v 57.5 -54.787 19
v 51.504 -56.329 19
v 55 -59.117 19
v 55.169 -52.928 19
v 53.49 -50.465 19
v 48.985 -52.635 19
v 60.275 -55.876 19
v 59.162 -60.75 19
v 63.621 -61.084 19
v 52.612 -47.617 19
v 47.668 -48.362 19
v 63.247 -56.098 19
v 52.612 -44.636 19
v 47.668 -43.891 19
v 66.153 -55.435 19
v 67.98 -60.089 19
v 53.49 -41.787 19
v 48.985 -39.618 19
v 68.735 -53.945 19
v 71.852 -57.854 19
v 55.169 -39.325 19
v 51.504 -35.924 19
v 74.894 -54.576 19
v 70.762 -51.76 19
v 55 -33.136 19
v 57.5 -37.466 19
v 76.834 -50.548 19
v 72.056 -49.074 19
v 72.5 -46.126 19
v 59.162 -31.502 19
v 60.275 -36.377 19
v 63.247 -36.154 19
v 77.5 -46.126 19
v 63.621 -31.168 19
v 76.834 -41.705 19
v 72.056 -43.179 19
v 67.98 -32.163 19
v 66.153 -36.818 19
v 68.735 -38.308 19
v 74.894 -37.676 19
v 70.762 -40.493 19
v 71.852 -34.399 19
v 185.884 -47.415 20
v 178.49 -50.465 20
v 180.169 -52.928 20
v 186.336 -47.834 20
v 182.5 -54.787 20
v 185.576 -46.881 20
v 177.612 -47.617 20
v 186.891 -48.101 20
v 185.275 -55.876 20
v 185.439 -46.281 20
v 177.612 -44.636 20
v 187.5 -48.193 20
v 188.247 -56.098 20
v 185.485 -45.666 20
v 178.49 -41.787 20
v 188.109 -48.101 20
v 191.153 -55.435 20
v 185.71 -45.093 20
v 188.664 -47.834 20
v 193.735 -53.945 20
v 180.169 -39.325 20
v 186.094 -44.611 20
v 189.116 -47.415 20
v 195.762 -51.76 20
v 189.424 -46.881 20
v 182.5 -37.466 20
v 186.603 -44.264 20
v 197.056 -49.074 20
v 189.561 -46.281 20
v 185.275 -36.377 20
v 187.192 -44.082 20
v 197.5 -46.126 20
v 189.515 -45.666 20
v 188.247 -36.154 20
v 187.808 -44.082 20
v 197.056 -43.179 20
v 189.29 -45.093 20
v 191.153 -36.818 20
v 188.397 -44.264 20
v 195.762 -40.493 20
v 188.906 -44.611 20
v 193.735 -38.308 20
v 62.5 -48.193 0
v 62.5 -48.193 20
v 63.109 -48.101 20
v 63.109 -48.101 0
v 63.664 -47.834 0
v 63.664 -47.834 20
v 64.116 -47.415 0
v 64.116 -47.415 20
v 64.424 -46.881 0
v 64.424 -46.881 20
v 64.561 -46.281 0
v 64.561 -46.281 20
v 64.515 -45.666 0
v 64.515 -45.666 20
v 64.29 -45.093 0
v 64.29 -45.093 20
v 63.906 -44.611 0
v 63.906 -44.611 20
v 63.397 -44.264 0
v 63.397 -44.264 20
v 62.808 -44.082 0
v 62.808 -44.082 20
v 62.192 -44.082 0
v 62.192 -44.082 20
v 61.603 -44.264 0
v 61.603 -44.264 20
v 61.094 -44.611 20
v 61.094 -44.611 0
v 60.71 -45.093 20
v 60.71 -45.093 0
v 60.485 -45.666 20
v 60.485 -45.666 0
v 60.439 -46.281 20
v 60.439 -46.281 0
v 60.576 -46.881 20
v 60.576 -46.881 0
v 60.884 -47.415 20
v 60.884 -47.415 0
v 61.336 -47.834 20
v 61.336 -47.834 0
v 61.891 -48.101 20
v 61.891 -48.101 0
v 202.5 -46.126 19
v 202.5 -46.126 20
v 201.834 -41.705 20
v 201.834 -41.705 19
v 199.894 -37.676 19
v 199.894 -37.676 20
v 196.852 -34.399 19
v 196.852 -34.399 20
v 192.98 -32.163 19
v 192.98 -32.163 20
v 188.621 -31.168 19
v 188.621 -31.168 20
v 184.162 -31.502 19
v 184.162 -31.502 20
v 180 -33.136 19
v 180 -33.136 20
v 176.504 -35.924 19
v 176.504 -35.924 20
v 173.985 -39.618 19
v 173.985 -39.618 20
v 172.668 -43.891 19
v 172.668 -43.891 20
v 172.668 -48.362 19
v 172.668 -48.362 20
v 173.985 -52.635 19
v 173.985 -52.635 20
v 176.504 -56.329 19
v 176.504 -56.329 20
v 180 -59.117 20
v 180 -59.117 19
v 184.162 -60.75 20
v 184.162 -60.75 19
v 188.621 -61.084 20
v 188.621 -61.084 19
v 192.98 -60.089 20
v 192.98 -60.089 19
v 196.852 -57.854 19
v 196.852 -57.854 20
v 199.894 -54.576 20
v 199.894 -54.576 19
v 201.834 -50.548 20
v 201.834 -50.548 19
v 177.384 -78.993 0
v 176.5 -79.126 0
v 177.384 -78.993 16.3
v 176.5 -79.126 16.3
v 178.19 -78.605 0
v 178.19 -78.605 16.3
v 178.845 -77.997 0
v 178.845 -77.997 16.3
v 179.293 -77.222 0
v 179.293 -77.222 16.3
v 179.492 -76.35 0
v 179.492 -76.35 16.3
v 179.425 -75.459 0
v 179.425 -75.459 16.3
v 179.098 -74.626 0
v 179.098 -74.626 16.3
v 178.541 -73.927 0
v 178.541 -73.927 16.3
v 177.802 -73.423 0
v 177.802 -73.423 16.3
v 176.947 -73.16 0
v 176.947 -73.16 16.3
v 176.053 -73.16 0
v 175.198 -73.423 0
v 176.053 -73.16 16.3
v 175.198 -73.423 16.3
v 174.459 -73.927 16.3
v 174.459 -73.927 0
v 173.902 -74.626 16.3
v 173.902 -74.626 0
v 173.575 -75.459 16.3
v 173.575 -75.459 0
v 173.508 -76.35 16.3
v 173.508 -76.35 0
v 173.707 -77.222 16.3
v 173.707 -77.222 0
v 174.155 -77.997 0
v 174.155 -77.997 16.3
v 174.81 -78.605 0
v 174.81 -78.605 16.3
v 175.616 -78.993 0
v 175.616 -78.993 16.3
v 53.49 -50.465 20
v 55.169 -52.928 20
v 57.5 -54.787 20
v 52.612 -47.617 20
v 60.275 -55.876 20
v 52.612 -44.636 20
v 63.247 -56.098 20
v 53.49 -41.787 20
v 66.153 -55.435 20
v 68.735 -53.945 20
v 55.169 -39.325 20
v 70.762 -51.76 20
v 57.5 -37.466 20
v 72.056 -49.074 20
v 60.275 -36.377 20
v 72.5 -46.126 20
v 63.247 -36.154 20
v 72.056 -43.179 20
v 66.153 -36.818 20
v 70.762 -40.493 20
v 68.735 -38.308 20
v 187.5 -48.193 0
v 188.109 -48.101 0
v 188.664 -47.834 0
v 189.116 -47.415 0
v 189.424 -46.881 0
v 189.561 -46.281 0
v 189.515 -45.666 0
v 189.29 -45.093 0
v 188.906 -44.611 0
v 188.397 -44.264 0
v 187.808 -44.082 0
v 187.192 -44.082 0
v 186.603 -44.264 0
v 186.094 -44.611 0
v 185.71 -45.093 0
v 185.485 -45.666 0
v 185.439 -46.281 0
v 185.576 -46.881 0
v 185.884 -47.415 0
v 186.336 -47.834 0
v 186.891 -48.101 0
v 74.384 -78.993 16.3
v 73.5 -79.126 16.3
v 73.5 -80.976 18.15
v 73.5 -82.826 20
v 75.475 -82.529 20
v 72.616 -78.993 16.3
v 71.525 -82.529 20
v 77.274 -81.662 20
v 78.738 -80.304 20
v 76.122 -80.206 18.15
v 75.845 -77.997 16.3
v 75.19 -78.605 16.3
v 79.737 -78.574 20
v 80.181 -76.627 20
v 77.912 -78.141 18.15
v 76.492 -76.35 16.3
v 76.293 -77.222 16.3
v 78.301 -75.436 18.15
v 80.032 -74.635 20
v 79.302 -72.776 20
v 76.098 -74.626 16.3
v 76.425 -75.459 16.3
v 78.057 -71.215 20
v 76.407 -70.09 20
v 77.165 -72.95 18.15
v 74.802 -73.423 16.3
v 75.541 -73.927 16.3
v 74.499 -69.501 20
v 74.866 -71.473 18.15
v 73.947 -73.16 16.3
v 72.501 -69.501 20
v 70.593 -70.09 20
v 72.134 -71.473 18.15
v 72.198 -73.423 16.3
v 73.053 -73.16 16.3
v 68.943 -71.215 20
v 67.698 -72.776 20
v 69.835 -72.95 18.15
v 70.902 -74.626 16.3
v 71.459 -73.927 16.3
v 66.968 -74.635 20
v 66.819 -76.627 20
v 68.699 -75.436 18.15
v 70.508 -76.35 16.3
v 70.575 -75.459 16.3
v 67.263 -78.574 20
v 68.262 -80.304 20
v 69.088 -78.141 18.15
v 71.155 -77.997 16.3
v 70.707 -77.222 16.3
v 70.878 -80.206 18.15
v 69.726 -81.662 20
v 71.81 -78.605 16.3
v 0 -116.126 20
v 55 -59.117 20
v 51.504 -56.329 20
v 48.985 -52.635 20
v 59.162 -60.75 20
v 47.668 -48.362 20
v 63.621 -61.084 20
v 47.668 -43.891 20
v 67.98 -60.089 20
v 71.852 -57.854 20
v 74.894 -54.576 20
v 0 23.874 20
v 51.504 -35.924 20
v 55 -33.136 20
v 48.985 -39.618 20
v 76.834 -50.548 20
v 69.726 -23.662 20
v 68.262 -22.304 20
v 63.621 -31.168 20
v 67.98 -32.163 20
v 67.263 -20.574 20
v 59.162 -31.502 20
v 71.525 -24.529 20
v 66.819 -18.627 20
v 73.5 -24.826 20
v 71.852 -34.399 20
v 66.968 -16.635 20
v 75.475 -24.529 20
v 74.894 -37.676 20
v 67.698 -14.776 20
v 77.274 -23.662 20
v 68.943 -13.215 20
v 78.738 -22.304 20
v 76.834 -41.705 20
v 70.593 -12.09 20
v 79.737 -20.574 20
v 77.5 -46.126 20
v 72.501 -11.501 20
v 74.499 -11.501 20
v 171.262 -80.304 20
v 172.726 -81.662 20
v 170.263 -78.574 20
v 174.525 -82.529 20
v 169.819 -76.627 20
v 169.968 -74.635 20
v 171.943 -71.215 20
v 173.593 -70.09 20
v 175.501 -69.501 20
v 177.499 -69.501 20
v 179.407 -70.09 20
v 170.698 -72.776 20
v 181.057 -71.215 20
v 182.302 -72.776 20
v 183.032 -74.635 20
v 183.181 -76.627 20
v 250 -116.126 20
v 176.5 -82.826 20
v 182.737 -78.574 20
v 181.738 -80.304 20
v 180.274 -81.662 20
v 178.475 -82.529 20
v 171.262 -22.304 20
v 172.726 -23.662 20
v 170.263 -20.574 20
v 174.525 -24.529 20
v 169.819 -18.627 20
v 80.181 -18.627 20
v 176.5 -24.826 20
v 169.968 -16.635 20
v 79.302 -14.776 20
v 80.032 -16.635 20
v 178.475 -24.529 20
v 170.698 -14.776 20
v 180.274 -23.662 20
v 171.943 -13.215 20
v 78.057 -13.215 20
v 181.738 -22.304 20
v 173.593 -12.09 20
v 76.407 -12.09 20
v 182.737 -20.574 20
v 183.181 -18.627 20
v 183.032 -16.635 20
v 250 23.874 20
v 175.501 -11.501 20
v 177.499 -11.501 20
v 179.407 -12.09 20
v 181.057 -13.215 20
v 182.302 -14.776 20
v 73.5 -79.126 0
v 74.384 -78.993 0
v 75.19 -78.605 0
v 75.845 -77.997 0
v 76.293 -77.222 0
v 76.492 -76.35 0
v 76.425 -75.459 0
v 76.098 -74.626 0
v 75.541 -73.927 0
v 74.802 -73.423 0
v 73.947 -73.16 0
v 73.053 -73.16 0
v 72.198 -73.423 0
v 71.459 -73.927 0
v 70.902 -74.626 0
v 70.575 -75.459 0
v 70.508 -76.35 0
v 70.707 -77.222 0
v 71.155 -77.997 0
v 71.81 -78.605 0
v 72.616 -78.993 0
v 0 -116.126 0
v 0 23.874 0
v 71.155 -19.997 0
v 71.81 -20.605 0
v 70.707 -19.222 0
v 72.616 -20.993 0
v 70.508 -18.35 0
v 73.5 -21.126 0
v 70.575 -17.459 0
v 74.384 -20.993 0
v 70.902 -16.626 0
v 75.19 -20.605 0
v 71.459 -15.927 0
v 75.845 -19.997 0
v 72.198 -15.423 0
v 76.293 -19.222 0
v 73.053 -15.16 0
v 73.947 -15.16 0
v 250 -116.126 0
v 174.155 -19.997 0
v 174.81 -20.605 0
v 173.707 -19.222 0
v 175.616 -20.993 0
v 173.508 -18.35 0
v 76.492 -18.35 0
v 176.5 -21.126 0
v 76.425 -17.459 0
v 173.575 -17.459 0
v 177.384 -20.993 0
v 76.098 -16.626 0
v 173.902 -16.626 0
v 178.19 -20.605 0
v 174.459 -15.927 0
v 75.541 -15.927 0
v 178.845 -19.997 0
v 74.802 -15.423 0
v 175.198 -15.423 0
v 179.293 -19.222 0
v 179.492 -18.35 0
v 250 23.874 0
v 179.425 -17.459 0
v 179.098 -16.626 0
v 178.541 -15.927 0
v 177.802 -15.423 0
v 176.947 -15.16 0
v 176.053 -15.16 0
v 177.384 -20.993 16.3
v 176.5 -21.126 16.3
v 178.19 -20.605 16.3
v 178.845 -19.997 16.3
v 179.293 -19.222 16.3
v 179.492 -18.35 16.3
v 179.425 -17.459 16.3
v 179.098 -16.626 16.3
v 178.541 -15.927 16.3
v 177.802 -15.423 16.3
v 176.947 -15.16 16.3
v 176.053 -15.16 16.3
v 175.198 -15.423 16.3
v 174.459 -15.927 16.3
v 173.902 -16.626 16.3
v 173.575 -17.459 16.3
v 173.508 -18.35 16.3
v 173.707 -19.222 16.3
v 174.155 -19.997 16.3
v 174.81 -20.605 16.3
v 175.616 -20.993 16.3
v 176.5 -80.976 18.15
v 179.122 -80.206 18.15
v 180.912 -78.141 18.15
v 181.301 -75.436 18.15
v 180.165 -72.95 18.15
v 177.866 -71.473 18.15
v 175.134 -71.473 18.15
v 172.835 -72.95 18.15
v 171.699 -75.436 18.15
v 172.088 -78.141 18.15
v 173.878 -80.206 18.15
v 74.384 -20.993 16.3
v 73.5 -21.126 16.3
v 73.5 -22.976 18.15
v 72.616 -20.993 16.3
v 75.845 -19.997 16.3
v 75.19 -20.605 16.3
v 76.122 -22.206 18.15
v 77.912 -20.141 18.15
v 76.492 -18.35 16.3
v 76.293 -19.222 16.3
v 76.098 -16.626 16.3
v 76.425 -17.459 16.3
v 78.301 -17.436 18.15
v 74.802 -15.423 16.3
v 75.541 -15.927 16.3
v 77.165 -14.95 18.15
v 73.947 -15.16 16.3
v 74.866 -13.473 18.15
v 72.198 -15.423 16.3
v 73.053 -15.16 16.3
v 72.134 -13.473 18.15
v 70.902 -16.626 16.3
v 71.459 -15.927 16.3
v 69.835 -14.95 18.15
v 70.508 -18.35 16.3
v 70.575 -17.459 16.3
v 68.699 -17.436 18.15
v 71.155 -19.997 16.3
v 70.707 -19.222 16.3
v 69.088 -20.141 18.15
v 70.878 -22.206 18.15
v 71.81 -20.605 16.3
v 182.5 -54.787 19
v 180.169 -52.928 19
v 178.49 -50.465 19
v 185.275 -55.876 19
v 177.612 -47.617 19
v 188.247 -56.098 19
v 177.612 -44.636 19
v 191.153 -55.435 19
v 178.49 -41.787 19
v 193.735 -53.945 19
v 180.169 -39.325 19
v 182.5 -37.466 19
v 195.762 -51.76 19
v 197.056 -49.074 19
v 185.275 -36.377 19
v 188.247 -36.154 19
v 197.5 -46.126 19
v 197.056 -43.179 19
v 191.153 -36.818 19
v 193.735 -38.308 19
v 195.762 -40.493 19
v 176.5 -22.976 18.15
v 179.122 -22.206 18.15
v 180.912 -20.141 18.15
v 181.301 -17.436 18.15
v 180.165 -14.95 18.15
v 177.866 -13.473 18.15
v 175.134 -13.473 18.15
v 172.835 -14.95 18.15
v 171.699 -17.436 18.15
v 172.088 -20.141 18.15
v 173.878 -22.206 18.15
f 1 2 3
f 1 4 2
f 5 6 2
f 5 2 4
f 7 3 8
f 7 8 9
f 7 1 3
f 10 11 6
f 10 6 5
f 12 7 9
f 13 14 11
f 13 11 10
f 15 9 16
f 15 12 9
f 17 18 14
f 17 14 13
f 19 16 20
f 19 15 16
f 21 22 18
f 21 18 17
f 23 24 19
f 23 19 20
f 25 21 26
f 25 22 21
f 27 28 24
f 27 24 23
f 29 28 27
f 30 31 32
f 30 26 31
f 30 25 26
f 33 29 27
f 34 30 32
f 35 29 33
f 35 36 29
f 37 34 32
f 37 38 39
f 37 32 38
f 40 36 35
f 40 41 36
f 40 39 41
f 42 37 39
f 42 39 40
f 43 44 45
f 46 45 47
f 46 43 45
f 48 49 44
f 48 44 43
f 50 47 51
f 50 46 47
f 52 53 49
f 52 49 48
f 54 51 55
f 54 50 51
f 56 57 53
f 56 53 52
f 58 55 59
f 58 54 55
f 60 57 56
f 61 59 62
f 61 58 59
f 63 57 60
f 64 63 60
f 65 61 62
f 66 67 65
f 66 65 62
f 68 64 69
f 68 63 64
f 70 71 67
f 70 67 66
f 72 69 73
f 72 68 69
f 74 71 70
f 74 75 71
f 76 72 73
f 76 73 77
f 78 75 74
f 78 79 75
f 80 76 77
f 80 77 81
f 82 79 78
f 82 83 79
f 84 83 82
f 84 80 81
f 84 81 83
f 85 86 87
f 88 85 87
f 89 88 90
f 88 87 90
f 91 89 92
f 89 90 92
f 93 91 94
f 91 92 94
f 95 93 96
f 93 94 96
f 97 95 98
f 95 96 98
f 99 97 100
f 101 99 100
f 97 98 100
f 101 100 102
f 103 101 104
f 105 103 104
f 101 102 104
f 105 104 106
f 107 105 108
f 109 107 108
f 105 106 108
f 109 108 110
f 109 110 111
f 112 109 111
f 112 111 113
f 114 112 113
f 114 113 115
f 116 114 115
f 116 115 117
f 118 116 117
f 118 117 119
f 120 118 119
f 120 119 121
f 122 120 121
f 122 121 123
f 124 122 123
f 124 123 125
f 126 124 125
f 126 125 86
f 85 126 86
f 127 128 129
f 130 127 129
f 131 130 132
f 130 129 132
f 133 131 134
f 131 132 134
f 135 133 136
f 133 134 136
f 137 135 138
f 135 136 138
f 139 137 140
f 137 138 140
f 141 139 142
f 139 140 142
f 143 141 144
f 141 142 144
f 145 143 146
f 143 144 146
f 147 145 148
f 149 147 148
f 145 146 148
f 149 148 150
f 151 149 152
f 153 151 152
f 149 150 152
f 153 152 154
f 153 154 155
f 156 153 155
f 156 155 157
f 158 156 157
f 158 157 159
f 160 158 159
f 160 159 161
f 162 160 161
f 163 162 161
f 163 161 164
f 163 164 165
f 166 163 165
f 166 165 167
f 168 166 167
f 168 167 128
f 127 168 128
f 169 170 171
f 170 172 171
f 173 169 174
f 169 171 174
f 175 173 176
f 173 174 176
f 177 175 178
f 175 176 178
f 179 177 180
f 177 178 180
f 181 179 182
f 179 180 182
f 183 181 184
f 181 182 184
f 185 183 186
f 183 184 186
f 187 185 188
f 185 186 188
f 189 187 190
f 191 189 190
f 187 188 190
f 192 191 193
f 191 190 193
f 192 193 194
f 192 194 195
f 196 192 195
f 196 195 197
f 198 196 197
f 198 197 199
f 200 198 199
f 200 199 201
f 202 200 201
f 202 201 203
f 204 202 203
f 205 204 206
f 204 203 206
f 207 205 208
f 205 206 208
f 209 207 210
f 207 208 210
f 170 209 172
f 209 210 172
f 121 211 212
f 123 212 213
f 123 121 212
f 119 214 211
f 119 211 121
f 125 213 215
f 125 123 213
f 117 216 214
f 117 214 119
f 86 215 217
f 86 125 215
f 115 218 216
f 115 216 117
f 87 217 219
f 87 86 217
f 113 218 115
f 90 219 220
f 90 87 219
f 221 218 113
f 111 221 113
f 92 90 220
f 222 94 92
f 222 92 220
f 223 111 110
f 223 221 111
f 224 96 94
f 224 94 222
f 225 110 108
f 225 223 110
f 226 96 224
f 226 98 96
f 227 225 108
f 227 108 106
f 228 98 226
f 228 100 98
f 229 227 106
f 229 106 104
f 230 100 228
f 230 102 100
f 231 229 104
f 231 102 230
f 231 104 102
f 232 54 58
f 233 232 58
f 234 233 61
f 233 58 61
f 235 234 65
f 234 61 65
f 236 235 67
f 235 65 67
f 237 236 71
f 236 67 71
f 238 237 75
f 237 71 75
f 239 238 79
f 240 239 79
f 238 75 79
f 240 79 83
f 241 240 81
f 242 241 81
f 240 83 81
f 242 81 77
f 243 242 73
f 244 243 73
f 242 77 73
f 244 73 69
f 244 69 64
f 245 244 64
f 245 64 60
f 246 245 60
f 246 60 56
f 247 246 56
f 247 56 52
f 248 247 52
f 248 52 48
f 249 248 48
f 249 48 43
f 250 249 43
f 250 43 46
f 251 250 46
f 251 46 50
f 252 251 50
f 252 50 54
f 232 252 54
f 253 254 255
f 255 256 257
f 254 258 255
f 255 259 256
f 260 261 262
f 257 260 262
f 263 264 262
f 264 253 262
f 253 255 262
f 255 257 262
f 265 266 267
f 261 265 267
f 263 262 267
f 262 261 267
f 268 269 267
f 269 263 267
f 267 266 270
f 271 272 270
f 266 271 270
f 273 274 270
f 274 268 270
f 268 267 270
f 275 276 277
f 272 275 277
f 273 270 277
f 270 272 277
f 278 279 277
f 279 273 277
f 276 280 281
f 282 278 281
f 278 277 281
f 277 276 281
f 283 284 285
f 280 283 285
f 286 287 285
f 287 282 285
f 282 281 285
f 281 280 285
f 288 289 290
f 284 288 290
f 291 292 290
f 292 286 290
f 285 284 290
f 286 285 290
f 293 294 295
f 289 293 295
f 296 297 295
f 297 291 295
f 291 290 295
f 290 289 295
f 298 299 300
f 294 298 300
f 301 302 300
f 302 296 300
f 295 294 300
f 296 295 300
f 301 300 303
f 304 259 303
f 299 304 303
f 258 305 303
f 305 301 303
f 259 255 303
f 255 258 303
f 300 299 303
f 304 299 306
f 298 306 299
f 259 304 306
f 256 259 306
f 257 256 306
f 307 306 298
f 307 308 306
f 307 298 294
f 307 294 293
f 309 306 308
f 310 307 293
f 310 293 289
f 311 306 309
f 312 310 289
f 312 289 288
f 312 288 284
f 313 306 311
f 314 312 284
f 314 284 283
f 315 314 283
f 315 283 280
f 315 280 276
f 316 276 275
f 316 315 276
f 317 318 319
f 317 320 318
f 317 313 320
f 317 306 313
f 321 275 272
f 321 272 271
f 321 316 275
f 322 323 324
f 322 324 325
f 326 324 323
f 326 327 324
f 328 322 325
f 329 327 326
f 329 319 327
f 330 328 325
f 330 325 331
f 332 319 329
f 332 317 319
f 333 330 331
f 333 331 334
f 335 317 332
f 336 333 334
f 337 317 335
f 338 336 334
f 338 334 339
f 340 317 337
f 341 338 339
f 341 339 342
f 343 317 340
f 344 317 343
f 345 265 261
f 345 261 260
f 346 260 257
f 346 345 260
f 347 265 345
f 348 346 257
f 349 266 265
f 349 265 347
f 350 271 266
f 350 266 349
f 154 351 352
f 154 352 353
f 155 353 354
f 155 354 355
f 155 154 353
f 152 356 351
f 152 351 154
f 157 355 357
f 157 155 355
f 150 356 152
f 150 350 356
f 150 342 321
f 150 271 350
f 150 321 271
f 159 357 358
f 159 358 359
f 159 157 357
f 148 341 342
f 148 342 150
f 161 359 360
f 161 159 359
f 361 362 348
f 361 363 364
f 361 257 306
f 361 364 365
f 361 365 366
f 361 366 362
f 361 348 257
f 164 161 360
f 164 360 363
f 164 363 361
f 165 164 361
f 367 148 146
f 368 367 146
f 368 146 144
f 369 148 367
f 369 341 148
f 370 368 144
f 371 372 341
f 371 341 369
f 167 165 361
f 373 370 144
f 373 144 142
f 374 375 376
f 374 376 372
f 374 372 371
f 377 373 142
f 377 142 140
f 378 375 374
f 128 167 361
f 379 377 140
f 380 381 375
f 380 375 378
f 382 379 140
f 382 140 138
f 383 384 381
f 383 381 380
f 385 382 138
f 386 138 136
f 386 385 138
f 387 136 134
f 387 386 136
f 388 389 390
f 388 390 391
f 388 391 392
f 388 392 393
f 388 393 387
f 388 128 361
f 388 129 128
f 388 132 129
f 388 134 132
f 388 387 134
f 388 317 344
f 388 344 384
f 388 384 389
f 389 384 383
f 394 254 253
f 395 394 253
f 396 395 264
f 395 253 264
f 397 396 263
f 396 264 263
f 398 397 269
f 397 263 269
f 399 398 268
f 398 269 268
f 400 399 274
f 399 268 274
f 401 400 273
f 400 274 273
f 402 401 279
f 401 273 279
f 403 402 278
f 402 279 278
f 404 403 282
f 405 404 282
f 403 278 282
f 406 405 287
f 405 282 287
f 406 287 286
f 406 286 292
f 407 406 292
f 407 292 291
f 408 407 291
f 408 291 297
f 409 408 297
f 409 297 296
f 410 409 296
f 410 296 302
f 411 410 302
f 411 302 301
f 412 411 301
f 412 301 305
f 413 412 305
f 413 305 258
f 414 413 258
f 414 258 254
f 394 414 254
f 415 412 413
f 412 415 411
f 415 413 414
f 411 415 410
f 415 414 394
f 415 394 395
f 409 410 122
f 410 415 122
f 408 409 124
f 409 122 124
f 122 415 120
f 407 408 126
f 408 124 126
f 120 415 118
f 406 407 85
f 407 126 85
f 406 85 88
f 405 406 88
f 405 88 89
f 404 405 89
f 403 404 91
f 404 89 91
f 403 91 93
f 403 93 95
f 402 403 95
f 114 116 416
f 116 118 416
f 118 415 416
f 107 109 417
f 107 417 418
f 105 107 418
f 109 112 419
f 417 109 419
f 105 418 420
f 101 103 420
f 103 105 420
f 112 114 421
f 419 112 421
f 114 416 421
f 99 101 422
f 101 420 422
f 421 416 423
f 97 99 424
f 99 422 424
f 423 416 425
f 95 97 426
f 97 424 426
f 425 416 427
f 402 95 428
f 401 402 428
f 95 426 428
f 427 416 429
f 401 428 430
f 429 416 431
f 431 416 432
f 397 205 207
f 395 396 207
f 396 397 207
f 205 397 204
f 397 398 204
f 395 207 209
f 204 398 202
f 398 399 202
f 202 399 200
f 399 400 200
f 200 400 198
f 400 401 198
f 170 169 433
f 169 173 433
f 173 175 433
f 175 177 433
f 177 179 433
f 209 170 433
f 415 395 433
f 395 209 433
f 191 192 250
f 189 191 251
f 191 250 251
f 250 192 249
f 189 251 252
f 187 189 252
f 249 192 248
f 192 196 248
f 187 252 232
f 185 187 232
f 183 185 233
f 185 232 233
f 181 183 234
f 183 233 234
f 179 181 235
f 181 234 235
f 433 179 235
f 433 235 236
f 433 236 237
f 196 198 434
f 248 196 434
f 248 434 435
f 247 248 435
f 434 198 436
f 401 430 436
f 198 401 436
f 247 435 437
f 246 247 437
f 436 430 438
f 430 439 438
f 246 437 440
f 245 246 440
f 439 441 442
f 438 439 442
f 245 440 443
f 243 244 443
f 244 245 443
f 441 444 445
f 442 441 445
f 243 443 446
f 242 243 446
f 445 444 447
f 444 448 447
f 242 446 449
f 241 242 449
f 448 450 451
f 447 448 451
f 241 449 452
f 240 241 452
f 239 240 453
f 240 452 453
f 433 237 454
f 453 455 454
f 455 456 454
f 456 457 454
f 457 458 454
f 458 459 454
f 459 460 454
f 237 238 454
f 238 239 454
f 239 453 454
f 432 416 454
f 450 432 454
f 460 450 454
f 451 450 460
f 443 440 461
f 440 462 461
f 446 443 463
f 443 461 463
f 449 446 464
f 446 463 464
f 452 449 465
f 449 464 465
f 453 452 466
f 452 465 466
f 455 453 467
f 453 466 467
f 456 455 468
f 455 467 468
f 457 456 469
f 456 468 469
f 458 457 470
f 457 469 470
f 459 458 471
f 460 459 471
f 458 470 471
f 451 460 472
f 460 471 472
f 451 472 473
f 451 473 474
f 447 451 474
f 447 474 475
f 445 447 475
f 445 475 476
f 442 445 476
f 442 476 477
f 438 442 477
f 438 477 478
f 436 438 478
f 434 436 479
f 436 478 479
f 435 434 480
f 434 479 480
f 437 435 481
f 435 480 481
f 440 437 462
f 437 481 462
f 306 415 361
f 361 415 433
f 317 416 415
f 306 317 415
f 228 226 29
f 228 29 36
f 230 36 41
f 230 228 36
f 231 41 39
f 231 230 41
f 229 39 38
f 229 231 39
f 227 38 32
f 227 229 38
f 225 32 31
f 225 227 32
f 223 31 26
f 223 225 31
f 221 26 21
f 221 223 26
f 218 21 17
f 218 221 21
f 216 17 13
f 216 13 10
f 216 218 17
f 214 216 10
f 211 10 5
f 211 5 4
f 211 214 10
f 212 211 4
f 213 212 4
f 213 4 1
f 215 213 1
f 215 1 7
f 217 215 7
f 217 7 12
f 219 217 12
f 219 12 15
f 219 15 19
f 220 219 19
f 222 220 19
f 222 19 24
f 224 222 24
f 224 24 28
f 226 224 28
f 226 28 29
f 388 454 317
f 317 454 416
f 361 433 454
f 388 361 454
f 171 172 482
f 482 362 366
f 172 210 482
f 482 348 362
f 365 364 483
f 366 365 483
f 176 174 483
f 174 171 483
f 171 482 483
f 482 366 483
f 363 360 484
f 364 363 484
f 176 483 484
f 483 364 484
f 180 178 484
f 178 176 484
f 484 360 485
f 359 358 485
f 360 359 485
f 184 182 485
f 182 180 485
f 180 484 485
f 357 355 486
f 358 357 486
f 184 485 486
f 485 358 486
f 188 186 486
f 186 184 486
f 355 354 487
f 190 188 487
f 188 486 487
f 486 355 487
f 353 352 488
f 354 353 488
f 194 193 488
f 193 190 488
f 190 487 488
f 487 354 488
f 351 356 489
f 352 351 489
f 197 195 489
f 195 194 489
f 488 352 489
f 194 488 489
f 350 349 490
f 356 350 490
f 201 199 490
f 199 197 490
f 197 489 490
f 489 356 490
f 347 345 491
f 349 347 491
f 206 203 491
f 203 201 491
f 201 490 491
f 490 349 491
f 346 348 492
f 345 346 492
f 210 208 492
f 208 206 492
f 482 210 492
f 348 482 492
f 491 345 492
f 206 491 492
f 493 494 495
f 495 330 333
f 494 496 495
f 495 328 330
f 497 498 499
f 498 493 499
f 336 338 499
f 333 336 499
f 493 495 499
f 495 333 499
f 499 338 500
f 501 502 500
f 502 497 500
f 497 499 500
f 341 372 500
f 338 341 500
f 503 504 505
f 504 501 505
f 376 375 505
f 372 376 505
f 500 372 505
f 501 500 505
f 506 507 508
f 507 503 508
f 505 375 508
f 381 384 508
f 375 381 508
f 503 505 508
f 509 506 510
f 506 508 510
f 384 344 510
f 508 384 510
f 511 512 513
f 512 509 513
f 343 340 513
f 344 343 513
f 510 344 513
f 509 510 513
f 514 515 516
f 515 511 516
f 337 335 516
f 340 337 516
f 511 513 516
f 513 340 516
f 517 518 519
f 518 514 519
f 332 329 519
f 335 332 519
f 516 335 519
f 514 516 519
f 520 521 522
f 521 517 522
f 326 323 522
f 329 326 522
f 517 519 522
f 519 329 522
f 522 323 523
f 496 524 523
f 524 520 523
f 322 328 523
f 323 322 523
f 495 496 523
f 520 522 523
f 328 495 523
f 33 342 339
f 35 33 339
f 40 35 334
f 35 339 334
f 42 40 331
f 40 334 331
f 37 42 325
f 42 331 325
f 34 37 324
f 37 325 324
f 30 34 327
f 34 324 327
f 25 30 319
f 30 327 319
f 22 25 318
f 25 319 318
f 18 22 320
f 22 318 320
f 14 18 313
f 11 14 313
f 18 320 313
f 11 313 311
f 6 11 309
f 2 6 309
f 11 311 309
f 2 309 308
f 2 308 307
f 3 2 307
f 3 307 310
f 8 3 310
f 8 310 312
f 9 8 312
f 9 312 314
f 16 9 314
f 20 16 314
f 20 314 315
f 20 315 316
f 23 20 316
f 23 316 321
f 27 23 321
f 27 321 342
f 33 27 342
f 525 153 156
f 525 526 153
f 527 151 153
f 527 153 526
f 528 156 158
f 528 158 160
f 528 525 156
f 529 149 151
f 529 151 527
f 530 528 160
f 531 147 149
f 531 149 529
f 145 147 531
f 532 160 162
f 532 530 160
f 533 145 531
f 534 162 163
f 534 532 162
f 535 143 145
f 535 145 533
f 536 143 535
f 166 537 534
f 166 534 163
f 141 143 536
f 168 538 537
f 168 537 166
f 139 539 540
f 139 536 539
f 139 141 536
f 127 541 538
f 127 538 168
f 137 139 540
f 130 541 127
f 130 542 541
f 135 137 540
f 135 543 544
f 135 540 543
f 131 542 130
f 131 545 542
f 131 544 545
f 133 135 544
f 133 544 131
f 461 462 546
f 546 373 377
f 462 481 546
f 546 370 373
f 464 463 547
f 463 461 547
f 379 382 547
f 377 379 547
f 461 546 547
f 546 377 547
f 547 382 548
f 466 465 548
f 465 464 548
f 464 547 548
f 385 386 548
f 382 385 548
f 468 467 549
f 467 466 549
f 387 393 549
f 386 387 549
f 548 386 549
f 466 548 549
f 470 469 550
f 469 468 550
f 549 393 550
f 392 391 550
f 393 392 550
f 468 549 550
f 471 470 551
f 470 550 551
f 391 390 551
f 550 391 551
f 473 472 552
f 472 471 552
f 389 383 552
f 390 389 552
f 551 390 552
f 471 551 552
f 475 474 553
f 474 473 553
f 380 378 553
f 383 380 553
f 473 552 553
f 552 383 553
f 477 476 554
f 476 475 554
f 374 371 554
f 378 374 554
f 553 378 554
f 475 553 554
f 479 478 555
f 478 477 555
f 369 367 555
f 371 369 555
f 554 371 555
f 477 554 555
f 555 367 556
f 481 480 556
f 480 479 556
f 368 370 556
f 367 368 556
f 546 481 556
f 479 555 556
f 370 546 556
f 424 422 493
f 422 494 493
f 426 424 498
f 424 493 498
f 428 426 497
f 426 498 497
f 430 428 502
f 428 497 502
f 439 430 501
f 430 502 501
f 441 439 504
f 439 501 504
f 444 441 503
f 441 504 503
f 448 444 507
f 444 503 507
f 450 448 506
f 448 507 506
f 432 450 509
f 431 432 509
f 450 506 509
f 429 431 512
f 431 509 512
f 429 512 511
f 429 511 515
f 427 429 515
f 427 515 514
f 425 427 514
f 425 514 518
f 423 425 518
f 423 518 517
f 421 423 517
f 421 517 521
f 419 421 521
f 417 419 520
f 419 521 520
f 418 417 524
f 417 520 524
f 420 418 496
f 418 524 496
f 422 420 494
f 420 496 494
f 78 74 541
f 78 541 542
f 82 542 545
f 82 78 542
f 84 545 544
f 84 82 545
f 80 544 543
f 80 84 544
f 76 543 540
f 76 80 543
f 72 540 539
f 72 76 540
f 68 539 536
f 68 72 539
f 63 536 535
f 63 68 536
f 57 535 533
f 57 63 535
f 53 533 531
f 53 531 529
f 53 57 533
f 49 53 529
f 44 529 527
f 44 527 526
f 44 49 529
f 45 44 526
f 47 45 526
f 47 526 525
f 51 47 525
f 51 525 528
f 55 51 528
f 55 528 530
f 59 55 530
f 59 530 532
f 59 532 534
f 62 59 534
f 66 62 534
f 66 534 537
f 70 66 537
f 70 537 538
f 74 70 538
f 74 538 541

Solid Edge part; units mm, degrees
sketch "Sketch1" plane through (0, 0, 0) normal (0, 0, 1) x (1, 0, 0)
  line L0 (0, -116.1263) -> (250, -116.1263)
  line L1 (250, -116.1263) -> (250, 23.8737)
  line L2 (250, 23.8737) -> (0, 23.8737)
  line L3 (0, 23.8737) -> (0, -116.1263)
  dimension "D1" = 250
  dimension "D2" = 140
extrude "Protrusion1" add sketch "Sketch1" along normal blind 20
hole "Hole1" at (187.5, -46.1263, 20) direction (0, 0, -1) diameter 4.134 end through all
hole "Hole2" at (62.5, -46.1263, 20) direction (0, 0, -1) diameter 4.134 end through all
sketch "Sketch2" plane through (125, -46.1263, 20) normal (0, 0, 1) x (1, 0, 0)
  circle A0 centre (-62.5, 0) radius 15
  circle A1 centre (62.5, 0) radius 10
  circle A2 centre (62.5, 0) radius 15
  circle A3 centre (-62.5, 0) radius 10
  dimension "D1" = 20
  dimension "D2" = 30
  dimension "D3" = 20
  dimension "D4" = 30
extrude "lager_plaatser" cut sketch "Sketch2" against normal blind 1
hole "Hole_3" at (176.5, -18.1263, 20) direction (0, 0, -1) diameter 6 end through all countersink diameter 13.4 countersink angle 90
hole "Hole3" at (176.5, -76.1263, 20) direction (0, 0, -1) diameter 6 end through all countersink diameter 13.4 countersink angle 90
hole "Hole4" at (73.5, -76.1263, 20) direction (0, 0, -1) diameter 6 end through all countersink diameter 13.4 countersink angle 90
hole "Hole5" at (73.5, -18.1263, 20) direction (0, 0, -1) diameter 6 end through all countersink diameter 13.4 countersink angle 90
